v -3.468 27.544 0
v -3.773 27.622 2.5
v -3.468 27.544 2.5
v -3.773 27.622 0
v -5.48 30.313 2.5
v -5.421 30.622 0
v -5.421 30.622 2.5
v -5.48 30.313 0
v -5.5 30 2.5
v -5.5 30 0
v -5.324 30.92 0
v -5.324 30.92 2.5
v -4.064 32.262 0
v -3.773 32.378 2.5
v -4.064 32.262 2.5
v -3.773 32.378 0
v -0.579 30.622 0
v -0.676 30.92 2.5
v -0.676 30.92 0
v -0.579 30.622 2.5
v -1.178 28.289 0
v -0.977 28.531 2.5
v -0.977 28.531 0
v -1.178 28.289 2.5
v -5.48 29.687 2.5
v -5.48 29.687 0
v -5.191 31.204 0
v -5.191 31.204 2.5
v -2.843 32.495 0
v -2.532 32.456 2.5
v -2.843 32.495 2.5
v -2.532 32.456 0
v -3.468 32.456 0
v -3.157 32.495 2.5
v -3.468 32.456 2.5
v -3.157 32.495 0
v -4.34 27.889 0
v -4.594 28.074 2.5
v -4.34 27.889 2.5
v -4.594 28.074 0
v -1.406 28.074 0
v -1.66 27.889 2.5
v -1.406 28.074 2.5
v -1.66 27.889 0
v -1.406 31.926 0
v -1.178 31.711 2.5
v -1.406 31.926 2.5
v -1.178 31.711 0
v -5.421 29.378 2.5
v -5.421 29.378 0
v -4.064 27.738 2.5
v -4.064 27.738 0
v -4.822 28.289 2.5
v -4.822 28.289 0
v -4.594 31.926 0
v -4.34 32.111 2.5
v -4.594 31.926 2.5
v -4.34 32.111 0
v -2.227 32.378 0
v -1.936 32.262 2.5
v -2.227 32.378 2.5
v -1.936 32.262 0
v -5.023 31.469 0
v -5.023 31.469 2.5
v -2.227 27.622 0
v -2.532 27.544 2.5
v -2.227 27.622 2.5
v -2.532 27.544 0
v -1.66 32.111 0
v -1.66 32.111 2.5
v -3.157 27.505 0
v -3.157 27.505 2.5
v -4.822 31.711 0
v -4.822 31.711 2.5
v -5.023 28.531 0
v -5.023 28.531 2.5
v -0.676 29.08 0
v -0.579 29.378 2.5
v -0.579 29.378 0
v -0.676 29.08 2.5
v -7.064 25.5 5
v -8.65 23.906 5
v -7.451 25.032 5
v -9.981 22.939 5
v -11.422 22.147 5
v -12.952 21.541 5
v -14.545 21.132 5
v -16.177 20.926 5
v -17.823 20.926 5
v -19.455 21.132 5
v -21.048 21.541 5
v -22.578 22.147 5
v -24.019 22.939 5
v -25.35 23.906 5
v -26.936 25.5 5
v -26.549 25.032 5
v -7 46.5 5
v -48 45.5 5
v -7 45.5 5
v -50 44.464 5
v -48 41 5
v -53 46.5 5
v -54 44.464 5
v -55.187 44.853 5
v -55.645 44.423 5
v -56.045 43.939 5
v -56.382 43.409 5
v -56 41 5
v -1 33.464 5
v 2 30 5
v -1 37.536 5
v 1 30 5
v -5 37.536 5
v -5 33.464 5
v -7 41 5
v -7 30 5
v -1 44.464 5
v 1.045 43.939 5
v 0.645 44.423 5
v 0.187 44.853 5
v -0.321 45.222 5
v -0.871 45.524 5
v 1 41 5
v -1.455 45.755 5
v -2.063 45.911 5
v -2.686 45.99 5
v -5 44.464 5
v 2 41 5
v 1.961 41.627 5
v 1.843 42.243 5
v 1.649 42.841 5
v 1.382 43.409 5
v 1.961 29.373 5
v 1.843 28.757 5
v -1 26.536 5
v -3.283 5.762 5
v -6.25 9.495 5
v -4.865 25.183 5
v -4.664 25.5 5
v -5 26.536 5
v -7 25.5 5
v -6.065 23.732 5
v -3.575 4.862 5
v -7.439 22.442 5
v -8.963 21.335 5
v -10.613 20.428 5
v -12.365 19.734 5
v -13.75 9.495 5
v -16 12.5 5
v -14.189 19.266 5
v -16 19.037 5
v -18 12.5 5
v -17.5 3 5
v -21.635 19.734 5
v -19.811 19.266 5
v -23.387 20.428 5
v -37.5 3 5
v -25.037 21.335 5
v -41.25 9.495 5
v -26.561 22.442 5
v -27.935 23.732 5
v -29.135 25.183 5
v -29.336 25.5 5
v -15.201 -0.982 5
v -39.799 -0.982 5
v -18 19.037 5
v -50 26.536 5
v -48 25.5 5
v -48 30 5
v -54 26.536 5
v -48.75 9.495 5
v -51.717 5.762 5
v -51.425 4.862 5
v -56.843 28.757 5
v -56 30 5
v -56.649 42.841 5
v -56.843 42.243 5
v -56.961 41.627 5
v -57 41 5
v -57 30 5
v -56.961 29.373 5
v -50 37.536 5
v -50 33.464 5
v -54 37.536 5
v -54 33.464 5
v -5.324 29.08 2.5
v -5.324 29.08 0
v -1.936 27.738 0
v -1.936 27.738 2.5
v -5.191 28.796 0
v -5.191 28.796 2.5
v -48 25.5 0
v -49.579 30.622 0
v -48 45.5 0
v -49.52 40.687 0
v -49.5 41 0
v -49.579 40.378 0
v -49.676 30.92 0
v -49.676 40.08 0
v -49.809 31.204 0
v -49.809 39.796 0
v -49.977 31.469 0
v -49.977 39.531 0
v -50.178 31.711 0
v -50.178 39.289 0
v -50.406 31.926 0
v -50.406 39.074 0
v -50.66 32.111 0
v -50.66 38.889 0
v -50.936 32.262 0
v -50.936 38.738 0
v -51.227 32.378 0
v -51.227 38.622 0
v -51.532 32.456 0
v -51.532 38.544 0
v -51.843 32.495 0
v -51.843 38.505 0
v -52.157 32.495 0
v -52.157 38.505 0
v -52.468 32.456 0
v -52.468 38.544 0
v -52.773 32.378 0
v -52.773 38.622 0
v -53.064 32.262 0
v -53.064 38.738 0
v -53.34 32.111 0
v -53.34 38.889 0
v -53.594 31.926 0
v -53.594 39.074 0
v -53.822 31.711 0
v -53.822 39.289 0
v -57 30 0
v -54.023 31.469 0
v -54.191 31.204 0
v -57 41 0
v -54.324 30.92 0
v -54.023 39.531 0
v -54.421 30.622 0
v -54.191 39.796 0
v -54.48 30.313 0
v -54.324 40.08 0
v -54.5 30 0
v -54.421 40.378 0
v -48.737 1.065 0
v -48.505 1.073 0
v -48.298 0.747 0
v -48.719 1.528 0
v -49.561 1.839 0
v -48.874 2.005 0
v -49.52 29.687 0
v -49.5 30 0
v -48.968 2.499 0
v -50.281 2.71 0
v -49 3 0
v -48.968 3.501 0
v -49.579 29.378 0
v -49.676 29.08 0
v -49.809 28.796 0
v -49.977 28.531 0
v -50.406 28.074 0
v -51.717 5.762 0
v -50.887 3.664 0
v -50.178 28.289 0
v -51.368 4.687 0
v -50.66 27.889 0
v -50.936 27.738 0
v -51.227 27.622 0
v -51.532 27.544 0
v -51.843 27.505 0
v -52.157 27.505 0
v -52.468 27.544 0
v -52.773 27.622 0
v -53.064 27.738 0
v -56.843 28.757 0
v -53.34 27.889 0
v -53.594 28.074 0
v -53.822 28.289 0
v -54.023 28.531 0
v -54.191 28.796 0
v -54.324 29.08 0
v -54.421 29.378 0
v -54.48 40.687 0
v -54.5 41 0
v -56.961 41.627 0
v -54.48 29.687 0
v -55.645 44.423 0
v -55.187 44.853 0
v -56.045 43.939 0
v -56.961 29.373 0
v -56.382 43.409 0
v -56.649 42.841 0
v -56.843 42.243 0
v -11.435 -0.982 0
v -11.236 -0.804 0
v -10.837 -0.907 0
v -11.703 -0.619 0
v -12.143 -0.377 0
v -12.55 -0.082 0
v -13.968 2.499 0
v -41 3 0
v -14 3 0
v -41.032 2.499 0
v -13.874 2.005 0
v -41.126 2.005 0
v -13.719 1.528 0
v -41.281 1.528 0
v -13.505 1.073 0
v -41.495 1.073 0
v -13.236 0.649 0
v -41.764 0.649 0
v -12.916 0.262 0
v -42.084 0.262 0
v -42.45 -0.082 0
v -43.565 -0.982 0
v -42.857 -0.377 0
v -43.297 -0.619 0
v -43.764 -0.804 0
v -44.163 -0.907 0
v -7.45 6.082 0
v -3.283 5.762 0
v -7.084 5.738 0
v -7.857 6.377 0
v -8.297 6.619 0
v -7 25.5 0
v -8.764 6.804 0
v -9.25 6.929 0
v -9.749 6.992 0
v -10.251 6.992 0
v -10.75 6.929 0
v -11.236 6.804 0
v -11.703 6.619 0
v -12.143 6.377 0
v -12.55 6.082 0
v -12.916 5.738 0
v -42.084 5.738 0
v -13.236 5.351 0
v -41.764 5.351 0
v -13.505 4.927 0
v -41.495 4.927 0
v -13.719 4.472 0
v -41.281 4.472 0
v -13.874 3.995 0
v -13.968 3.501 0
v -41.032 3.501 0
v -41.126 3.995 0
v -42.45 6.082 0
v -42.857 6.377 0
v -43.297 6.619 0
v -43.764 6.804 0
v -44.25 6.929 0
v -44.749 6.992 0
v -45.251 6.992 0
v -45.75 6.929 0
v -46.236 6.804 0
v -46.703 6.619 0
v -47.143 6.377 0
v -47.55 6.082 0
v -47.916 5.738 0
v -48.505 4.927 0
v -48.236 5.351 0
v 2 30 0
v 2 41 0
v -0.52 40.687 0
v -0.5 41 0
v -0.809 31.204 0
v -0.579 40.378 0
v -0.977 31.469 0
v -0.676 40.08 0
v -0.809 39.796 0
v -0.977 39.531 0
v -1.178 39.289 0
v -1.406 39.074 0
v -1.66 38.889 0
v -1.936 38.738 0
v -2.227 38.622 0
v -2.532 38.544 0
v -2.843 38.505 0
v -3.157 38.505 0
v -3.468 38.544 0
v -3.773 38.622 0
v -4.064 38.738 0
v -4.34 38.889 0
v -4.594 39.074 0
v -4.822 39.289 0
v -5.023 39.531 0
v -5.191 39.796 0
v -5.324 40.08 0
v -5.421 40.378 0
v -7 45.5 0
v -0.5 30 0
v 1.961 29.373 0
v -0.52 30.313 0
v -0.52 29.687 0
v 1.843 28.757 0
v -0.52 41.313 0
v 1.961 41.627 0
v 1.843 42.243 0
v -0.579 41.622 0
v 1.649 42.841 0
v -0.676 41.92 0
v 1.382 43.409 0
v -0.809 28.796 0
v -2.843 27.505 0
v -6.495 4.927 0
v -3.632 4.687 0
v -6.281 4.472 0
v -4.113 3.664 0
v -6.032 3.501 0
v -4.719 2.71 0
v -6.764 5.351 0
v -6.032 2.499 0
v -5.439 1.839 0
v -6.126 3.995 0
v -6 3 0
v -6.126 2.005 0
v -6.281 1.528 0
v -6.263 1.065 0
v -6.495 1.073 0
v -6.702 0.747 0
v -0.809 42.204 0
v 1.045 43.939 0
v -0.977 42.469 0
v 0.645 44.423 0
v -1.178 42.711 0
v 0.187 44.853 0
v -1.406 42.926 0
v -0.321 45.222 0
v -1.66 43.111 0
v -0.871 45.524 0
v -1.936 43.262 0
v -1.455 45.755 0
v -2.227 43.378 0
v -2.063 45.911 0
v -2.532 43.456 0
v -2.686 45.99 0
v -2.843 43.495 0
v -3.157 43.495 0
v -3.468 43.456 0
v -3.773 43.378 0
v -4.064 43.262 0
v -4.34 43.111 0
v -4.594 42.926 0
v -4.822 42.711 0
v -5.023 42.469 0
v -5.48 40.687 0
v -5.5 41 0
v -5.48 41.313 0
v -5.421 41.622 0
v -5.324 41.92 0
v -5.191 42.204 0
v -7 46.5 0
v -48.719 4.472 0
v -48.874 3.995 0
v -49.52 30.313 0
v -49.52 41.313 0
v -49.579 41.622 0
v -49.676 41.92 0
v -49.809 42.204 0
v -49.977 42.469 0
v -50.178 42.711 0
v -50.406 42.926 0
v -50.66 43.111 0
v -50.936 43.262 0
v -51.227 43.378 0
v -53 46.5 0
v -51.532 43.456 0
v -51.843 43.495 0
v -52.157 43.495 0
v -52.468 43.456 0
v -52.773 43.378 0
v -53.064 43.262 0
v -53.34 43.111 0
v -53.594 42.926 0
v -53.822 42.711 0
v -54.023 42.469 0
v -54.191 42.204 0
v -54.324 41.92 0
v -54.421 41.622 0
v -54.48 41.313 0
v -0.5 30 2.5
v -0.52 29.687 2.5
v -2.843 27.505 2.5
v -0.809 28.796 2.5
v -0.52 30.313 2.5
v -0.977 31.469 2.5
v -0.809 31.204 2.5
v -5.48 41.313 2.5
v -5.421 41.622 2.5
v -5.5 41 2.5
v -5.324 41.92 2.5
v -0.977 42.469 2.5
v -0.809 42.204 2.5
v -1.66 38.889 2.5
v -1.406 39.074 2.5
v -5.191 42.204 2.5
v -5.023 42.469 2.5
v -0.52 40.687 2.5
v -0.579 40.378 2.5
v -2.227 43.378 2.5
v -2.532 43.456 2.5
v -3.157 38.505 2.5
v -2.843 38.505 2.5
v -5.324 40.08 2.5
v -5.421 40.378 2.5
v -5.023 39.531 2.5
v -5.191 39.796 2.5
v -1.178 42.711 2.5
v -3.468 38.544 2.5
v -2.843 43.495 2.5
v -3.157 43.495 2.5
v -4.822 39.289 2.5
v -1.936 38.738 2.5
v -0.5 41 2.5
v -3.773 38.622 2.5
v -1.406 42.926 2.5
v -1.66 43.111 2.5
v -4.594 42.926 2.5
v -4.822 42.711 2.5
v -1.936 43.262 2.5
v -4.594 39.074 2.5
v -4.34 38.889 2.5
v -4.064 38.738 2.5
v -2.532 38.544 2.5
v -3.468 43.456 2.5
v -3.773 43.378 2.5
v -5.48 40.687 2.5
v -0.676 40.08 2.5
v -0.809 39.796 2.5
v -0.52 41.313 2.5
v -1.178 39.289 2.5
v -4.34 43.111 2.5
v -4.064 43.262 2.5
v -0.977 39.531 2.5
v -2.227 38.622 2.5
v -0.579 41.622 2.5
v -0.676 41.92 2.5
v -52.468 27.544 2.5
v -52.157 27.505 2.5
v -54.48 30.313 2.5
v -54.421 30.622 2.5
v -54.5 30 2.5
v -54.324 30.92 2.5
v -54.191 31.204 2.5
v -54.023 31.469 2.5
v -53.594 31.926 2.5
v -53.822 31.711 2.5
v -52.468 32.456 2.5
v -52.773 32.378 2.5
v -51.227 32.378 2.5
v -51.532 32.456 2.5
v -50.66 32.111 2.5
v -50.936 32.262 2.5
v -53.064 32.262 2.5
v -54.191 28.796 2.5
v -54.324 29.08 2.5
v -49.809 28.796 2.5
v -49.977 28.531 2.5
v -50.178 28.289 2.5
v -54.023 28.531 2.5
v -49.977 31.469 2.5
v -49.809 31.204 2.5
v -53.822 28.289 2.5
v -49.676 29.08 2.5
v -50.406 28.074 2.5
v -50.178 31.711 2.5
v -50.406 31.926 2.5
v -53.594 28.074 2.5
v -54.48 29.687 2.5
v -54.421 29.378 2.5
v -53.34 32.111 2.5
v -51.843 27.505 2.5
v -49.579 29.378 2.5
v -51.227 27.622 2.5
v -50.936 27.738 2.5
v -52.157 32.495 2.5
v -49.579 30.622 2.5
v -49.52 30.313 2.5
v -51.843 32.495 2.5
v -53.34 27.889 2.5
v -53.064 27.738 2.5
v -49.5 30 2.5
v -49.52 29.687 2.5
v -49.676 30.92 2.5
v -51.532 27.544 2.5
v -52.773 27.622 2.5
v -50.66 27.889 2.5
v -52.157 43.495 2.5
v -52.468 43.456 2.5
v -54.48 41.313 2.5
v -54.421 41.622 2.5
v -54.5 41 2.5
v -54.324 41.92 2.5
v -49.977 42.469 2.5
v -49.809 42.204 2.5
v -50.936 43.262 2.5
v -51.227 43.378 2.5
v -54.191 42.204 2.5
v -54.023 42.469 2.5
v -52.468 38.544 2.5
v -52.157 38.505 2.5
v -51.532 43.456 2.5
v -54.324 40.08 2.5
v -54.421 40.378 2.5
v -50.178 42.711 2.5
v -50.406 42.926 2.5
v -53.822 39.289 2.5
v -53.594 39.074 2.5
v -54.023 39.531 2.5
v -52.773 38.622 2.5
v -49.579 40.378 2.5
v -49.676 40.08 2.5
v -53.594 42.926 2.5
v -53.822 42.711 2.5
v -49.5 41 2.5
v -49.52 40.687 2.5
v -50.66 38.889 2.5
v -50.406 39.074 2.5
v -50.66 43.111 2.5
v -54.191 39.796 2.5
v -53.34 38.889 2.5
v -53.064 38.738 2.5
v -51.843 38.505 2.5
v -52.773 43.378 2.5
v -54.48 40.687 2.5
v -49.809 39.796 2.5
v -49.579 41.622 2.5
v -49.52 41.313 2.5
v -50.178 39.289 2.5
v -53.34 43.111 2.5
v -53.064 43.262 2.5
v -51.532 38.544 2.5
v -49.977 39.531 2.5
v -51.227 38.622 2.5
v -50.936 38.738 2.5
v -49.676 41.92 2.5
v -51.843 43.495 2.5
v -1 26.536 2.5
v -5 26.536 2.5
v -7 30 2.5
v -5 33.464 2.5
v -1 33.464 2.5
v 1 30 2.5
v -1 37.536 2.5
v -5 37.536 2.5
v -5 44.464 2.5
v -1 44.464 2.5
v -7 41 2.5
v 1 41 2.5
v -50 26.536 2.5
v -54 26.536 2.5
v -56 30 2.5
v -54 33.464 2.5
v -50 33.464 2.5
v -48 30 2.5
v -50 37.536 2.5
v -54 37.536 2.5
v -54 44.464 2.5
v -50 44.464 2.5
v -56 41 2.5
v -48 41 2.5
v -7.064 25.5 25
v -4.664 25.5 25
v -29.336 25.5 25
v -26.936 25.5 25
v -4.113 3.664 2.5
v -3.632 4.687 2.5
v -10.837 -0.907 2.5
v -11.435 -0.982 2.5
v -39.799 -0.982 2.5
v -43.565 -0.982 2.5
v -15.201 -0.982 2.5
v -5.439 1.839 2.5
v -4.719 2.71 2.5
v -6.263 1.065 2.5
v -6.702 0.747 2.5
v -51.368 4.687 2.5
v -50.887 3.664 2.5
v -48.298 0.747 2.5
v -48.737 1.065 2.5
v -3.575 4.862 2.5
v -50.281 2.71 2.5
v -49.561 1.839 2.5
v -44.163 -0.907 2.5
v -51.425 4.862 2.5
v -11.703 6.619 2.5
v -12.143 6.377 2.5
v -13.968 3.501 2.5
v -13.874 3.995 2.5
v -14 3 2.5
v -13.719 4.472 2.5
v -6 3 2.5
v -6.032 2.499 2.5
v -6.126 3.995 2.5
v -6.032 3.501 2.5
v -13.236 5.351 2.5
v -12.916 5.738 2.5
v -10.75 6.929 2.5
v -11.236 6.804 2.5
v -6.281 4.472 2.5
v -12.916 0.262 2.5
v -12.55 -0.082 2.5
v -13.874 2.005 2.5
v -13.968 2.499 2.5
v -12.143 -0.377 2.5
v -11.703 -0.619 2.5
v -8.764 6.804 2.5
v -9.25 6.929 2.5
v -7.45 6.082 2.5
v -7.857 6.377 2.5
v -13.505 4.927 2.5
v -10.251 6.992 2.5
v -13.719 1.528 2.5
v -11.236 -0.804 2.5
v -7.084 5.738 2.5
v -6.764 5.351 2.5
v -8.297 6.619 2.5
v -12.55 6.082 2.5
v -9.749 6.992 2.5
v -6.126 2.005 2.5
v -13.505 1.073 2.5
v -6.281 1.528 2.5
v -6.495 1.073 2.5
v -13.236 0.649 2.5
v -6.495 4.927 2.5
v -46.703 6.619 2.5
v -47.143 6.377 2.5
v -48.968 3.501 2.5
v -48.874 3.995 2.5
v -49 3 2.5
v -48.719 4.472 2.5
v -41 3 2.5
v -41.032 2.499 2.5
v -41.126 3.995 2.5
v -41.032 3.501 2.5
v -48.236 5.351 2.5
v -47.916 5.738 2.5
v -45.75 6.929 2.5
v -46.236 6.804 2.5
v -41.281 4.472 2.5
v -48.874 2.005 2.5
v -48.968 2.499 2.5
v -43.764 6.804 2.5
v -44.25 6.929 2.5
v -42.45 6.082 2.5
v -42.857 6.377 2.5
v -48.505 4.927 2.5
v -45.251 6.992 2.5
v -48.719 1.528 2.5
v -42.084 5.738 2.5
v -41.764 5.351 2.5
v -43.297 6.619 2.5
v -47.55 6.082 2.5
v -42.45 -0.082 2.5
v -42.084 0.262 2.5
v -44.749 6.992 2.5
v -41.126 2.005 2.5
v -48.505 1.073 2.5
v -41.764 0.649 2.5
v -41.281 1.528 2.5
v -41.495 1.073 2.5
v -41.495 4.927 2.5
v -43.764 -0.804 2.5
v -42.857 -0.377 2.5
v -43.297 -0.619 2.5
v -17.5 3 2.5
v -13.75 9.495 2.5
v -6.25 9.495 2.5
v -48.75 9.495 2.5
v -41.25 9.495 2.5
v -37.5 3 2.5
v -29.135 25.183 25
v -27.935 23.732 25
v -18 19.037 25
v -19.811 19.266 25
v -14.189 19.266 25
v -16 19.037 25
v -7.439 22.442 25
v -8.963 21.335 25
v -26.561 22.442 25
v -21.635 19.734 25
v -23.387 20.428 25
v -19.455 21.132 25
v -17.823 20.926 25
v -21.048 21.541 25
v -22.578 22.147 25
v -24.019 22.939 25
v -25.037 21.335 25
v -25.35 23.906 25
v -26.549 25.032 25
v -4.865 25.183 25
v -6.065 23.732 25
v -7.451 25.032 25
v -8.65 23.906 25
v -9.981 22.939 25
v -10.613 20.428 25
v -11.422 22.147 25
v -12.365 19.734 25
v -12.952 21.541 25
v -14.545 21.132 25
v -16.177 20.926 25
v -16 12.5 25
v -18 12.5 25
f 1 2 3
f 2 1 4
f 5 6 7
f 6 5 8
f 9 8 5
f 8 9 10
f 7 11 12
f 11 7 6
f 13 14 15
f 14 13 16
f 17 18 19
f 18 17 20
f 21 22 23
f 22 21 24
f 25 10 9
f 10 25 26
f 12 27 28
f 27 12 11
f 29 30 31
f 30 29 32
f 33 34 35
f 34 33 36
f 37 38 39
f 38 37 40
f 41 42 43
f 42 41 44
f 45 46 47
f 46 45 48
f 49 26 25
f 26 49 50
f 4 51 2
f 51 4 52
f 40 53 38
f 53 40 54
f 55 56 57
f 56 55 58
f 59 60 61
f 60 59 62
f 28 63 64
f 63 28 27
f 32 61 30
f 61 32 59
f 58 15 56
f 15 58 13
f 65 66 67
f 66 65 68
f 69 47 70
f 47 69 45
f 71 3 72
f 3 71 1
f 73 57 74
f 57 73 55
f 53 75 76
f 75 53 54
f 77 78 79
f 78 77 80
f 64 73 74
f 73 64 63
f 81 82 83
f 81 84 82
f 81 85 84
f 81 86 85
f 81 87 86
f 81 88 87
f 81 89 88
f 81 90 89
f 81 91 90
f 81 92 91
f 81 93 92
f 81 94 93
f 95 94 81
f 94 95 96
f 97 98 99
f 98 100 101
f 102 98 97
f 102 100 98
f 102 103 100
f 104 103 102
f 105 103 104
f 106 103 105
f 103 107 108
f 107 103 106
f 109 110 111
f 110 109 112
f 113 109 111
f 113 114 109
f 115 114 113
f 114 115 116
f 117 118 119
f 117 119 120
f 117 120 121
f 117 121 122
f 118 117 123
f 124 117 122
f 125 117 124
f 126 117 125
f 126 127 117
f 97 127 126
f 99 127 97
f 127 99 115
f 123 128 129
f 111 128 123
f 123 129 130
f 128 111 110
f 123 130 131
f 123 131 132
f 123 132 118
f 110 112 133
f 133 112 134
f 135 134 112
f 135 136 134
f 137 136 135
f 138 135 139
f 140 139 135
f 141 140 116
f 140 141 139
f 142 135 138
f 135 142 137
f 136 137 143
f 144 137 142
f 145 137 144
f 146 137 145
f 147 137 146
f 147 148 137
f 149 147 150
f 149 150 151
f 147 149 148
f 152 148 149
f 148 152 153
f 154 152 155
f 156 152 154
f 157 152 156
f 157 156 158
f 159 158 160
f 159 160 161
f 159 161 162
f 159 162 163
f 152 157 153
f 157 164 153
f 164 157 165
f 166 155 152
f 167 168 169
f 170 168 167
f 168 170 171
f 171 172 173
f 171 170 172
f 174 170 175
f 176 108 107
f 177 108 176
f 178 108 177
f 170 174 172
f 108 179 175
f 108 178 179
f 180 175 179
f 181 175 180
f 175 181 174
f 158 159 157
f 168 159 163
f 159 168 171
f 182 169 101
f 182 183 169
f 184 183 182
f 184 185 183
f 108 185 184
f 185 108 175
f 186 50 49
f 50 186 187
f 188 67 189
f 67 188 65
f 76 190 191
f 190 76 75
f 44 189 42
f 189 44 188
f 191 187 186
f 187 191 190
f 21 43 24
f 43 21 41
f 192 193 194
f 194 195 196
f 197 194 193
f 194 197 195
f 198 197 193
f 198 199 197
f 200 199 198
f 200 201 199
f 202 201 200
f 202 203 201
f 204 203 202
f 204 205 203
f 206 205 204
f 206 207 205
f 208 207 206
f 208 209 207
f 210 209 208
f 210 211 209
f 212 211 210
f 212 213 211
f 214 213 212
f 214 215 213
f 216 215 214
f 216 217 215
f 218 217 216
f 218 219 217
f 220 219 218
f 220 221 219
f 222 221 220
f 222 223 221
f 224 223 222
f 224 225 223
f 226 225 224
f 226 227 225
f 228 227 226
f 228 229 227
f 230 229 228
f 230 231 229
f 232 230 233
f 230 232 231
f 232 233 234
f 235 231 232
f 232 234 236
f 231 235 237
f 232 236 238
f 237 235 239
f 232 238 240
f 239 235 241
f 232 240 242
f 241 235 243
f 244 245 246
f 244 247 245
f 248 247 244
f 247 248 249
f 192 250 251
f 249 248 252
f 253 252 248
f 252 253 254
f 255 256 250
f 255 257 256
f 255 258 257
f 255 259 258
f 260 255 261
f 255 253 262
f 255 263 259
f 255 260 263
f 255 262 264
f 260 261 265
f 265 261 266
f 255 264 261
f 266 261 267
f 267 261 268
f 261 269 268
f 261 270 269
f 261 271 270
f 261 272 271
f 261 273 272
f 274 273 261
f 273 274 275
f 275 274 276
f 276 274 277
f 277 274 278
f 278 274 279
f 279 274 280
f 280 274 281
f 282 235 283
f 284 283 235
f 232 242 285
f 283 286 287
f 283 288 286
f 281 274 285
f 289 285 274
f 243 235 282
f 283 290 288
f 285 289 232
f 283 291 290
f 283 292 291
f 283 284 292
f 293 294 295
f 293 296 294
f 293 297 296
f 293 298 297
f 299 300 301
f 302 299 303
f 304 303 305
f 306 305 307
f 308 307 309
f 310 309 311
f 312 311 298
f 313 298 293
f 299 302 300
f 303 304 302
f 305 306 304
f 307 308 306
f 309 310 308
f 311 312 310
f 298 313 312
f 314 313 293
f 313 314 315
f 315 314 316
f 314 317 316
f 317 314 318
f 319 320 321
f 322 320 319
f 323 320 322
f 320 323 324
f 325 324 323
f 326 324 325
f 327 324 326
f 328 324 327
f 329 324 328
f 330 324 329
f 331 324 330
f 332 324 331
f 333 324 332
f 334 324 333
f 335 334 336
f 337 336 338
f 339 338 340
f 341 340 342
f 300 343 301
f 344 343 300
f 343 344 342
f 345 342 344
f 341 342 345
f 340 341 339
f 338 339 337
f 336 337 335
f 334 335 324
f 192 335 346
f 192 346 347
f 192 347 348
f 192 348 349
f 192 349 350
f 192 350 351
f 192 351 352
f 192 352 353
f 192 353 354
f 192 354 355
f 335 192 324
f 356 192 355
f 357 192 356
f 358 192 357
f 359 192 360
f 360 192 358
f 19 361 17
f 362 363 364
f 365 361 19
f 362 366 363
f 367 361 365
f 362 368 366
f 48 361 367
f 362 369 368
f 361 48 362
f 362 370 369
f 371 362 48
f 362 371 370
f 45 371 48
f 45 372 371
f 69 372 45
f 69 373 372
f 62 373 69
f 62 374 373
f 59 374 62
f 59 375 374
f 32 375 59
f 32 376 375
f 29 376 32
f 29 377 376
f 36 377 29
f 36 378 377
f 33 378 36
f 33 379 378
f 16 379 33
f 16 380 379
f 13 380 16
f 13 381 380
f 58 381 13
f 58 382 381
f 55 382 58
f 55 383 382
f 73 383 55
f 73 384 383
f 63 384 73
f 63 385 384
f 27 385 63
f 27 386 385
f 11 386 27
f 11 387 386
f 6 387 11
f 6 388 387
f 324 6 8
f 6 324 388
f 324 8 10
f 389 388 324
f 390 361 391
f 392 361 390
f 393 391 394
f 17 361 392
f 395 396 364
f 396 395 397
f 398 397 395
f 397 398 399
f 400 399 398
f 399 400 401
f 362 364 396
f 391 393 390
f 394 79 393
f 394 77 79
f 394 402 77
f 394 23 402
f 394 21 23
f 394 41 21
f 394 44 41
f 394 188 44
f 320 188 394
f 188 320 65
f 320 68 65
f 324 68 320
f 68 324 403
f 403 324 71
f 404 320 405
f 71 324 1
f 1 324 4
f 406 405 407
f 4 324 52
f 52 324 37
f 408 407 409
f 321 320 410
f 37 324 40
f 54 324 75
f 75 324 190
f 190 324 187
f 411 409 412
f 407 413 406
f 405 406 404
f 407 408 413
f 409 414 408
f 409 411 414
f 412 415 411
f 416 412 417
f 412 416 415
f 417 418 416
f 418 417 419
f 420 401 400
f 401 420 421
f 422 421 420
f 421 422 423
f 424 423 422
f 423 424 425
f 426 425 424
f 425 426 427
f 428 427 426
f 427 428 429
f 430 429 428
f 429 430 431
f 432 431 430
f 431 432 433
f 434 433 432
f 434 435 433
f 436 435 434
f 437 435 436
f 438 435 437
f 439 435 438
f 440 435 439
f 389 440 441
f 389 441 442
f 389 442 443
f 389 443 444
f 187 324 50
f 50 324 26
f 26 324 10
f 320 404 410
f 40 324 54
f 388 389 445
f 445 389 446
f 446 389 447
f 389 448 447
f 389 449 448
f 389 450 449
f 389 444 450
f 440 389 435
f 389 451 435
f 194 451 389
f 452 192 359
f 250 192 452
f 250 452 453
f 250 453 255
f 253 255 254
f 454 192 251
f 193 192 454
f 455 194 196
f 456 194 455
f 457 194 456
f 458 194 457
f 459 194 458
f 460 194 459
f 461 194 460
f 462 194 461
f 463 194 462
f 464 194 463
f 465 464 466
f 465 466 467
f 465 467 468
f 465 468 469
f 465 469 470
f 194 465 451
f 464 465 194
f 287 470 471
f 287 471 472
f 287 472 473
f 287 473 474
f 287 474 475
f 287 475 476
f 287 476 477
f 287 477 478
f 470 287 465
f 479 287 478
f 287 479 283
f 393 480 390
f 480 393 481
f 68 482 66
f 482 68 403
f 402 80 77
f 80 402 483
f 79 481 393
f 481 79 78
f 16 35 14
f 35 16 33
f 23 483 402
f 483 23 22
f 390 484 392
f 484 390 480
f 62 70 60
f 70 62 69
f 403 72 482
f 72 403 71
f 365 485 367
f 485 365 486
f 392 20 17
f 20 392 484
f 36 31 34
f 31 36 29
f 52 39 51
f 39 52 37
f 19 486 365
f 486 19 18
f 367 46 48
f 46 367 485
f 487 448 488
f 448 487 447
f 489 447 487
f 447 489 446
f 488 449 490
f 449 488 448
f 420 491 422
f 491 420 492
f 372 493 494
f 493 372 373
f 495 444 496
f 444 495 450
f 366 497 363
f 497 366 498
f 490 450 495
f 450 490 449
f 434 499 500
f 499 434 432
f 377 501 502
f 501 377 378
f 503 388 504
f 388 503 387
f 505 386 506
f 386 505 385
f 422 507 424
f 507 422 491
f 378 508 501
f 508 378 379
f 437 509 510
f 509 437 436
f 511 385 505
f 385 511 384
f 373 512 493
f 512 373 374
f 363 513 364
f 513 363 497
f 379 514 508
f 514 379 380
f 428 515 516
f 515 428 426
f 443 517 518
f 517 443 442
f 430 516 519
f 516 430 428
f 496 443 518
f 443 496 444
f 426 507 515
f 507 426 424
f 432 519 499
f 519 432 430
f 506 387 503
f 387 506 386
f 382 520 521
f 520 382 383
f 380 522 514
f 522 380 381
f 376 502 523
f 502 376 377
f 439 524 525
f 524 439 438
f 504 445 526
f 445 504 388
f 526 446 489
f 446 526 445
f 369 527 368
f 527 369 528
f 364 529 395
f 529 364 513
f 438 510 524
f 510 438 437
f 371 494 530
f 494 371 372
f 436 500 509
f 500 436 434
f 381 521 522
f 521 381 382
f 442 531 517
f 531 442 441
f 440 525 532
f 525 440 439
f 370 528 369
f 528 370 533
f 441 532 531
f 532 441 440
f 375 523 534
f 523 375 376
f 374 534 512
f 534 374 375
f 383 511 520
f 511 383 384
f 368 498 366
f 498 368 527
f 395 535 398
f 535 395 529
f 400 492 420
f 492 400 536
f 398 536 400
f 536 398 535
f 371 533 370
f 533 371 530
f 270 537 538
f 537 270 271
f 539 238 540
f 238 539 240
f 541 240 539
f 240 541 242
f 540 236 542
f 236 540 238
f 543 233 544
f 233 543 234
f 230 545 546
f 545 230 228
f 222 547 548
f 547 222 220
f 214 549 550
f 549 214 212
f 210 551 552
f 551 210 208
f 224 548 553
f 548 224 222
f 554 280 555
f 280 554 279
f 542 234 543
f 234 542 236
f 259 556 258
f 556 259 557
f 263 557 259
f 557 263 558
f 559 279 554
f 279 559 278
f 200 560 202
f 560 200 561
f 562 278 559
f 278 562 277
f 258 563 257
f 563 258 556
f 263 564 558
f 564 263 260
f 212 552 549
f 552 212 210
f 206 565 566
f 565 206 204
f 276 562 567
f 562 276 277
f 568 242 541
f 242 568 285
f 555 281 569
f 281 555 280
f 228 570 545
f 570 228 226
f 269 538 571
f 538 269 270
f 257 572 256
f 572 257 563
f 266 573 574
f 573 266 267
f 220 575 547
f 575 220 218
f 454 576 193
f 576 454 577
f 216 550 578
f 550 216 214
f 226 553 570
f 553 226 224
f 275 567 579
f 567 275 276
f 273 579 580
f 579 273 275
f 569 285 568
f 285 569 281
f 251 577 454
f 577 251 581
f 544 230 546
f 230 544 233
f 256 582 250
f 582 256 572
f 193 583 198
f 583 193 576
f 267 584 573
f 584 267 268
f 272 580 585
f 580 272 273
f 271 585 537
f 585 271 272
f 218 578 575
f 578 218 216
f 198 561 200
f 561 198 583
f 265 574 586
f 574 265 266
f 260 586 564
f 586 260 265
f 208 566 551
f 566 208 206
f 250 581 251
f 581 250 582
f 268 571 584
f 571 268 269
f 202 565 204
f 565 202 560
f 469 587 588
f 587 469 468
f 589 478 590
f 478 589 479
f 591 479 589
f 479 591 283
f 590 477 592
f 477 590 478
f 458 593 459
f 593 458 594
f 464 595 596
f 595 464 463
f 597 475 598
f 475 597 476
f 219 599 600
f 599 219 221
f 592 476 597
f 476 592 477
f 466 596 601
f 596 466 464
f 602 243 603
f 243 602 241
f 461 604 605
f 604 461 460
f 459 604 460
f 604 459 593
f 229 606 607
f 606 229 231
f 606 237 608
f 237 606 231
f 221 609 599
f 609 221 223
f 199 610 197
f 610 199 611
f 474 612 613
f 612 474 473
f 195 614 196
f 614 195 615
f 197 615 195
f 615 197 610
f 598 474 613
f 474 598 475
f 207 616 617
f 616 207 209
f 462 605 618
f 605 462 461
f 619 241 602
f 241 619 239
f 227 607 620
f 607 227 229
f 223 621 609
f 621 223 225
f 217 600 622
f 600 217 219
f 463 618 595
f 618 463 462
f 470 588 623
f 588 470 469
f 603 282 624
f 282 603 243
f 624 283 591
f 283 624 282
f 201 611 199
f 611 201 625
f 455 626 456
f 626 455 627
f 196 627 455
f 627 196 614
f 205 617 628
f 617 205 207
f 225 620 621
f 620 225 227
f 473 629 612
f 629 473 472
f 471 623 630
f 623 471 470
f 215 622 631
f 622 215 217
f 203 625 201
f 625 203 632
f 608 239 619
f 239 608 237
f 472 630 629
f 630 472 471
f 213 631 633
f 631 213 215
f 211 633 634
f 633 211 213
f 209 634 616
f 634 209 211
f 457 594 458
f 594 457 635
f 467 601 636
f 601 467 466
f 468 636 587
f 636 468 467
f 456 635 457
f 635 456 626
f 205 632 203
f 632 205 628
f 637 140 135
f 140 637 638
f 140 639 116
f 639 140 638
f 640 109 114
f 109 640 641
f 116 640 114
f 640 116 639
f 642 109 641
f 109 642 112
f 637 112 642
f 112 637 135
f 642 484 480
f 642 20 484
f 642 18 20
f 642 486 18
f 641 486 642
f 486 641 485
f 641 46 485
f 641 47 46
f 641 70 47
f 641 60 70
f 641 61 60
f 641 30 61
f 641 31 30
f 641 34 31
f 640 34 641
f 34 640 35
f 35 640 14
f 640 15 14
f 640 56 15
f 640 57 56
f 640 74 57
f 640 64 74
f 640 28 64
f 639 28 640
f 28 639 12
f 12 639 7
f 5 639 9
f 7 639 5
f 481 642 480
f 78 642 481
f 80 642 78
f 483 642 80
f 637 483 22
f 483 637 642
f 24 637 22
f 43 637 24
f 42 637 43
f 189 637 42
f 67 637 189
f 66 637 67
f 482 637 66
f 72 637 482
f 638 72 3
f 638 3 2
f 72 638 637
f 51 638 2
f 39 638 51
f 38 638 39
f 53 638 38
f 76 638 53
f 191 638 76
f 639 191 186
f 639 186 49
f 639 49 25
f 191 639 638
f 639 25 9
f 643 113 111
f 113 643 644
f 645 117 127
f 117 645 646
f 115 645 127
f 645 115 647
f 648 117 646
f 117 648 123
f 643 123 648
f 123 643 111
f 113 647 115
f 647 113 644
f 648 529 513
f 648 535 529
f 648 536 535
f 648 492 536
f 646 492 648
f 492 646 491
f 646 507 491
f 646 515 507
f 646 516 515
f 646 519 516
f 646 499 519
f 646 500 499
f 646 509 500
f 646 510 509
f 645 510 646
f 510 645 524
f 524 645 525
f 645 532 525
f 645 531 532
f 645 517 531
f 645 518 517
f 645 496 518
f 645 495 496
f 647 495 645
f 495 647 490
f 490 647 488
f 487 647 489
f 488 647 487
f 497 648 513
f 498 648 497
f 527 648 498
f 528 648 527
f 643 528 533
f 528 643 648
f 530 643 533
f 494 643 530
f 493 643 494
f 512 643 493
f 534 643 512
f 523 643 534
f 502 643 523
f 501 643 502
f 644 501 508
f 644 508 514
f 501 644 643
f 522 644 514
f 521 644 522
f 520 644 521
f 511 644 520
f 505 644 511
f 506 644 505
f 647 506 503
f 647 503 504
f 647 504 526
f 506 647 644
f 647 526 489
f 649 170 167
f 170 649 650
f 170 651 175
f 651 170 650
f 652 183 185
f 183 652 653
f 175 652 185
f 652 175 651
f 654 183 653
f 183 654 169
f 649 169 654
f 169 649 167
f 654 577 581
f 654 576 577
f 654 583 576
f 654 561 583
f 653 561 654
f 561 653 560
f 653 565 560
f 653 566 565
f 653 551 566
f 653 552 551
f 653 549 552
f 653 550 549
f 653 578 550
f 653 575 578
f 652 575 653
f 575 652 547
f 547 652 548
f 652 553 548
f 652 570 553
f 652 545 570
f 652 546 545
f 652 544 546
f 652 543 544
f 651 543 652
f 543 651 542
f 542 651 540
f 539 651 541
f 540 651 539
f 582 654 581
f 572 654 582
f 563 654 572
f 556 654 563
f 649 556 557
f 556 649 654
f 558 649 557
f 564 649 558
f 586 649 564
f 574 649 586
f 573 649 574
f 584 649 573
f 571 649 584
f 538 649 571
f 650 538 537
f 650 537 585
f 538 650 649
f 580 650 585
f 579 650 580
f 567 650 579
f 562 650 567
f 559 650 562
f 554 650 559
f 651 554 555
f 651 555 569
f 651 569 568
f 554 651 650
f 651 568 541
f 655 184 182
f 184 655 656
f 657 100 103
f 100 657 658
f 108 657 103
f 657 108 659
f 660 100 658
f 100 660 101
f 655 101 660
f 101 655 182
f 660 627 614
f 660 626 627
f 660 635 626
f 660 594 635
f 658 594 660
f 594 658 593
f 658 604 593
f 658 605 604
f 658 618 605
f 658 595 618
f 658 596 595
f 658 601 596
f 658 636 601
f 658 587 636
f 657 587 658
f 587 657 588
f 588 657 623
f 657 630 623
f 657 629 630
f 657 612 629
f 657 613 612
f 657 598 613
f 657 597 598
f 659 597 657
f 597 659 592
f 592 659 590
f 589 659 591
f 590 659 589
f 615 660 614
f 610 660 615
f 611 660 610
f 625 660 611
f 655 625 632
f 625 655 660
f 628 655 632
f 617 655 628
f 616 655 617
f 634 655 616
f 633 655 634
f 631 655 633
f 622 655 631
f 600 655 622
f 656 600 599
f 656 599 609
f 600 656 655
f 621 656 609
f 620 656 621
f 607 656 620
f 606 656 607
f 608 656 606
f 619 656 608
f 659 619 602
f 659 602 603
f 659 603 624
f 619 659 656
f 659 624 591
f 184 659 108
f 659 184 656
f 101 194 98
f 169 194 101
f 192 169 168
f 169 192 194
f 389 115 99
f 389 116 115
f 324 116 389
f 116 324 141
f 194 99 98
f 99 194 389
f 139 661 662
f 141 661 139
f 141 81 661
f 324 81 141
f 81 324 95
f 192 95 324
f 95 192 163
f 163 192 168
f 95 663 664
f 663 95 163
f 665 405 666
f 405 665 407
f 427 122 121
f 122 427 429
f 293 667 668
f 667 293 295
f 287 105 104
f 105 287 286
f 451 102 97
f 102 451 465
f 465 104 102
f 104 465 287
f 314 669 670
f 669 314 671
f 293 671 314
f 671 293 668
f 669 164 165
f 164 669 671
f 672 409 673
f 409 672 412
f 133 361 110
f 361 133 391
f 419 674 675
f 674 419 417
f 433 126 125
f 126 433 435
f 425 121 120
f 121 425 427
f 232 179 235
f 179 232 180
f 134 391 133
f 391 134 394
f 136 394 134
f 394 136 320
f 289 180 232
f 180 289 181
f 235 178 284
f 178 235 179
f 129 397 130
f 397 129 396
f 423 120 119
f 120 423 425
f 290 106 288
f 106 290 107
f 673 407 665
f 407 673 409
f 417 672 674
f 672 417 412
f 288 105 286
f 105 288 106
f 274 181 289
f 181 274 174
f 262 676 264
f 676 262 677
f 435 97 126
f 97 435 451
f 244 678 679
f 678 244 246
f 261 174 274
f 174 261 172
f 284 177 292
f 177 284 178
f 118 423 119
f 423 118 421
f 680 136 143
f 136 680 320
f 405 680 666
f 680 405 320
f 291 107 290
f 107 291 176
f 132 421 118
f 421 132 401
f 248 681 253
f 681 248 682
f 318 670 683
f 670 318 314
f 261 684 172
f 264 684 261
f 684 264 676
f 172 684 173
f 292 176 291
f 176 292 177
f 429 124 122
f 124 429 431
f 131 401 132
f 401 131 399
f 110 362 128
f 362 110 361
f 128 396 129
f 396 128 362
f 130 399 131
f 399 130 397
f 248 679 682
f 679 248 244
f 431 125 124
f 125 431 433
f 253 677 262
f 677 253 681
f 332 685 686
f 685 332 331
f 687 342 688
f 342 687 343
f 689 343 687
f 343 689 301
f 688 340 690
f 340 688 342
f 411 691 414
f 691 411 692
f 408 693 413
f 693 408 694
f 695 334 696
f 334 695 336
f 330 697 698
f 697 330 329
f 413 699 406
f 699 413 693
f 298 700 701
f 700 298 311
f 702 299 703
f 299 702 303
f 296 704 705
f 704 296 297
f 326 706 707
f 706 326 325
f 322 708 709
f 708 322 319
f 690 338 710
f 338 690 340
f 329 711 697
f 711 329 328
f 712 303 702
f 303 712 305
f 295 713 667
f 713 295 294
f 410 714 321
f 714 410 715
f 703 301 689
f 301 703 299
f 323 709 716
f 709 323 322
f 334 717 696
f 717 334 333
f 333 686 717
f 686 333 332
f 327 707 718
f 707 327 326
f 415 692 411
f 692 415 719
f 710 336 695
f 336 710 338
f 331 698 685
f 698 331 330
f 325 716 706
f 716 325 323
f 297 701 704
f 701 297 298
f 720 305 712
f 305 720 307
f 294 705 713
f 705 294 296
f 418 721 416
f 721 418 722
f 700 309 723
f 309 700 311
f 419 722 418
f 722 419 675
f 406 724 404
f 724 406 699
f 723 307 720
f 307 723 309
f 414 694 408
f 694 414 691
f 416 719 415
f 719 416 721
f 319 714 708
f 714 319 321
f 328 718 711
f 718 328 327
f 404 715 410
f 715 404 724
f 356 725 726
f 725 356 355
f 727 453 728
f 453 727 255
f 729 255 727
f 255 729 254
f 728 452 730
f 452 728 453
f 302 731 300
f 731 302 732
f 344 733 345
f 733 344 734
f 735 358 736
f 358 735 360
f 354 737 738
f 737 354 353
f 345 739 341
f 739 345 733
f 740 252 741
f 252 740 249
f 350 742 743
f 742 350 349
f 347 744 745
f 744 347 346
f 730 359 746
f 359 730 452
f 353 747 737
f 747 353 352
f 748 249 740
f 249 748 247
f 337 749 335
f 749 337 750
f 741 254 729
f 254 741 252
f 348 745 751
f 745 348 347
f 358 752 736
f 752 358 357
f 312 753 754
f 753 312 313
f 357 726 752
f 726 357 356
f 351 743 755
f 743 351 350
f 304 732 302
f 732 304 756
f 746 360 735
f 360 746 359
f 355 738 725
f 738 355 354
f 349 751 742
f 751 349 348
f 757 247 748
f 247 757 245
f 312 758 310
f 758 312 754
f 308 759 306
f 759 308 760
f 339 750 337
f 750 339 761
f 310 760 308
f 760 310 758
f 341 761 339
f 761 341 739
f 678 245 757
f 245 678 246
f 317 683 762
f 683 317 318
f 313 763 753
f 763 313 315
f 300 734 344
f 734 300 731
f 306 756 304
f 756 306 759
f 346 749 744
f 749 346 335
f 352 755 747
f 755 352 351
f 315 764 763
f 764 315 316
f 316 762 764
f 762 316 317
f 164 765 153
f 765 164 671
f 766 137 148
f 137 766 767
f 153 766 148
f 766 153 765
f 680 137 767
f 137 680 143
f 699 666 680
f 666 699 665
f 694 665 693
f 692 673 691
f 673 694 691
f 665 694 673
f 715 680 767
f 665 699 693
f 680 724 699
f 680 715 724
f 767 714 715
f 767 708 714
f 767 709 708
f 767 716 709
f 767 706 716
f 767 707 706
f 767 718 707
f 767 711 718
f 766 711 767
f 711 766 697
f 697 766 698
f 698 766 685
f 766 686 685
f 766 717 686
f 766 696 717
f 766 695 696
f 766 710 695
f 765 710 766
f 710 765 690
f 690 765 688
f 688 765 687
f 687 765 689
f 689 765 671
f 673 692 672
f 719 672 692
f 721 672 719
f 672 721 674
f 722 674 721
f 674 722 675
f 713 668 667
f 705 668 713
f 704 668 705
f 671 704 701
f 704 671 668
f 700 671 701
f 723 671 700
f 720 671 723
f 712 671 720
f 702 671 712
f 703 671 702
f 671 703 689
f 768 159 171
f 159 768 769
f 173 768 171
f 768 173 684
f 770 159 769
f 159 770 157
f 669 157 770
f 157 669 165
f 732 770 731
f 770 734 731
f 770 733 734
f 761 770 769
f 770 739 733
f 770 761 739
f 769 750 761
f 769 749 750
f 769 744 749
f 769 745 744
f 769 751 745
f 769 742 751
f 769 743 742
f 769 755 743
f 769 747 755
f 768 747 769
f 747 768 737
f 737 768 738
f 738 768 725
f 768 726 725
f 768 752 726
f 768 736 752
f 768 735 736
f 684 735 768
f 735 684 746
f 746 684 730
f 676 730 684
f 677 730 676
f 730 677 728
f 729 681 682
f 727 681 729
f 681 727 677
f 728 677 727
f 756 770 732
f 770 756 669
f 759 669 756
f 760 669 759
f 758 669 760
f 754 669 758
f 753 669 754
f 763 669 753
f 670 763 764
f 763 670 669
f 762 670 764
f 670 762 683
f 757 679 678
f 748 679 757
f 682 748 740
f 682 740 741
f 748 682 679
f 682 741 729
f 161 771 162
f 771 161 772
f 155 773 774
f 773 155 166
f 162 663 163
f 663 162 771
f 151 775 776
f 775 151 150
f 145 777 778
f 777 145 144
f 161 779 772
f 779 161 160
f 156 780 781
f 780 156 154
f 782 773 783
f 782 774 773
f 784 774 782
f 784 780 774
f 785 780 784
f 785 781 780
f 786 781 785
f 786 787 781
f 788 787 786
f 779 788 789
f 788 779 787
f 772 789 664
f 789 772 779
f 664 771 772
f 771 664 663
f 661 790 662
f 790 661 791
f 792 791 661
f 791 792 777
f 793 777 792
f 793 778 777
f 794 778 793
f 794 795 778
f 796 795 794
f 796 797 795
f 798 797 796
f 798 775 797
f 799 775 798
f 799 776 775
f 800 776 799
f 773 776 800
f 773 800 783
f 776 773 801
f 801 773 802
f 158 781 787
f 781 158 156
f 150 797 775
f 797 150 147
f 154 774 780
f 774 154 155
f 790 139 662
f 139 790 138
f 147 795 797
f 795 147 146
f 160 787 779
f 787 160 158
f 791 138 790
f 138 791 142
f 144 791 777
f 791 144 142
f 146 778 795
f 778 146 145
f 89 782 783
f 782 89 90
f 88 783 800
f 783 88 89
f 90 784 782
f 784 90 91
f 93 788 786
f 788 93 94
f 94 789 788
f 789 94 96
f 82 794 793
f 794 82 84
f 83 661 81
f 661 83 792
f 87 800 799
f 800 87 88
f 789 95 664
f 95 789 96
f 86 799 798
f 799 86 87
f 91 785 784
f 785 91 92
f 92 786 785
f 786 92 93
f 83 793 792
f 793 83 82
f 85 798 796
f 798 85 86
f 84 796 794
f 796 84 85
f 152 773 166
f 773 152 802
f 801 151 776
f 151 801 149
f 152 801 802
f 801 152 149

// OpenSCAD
$fn=50;

module servo(h1){
    translate([0,0,0])cylinder(r=2.5,h=h1);
    translate([0,11,0])cylinder(r=2.5,h=h1);
    translate([49,0,0])cylinder(r=2.5,h=h1);
    translate([49,11,0])cylinder(r=2.5,h=h1);
    translate([0,0,h1/2])cylinder(r=4,h=h1/2,$fn=6);
    translate([0,11,h1/2])cylinder(r=4,h=h1/2,$fn=6);
    translate([49,0,h1/2])cylinder(r=4,h=h1/2,$fn=6);
    translate([49,11,h1/2])cylinder(r=4,h=h1/2,$fn=6);
    translate([4,-4.5,0])cube([41,20,h1]);
}
module body(){
    hull(){
    translate([3,30,0]){
        translate([0,0,0])cylinder(r=5,h=5);
        translate([0,11,0])cylinder(r=5,h=5);
        translate([49,0,0])cylinder(r=5,h=5);
        translate([49,11,0])cylinder(r=5,h=5);
        translate([4,-8.5,0])cube([46,25,5]);
    }
    translate([12,8,0])cylinder(r=9,h=5);
    translate([55-12,8,0])cylinder(r=9,h=5);
}
}
mirror([1,0,0]){
difference(){
    //body
    body();
    //bearings
    translate([10,3,0])cylinder(r=4,h=5);
    translate([57-12,3,0])cylinder(r=4,h=5);
    translate([10,3,2.5])cylinder(r=7.5,h=5,$fn=6);
    translate([57-12,3,2.5])cylinder(r=7.5,h=5,$fn=6);
    //servo holes
    translate([3,30,0])servo(5);
    //translate([27.5,15.5,0])cylinder(r=9,h=5);
}
difference(){
    translate([17,34,5])cylinder(r=15,h=20);
    translate([17,34,5])cylinder(r=13.1,h=25);
    translate([0,25.5,0])cube([100,100,100]);
}
translate([16,12.5,0])cube([2,7.5,25]);
}
